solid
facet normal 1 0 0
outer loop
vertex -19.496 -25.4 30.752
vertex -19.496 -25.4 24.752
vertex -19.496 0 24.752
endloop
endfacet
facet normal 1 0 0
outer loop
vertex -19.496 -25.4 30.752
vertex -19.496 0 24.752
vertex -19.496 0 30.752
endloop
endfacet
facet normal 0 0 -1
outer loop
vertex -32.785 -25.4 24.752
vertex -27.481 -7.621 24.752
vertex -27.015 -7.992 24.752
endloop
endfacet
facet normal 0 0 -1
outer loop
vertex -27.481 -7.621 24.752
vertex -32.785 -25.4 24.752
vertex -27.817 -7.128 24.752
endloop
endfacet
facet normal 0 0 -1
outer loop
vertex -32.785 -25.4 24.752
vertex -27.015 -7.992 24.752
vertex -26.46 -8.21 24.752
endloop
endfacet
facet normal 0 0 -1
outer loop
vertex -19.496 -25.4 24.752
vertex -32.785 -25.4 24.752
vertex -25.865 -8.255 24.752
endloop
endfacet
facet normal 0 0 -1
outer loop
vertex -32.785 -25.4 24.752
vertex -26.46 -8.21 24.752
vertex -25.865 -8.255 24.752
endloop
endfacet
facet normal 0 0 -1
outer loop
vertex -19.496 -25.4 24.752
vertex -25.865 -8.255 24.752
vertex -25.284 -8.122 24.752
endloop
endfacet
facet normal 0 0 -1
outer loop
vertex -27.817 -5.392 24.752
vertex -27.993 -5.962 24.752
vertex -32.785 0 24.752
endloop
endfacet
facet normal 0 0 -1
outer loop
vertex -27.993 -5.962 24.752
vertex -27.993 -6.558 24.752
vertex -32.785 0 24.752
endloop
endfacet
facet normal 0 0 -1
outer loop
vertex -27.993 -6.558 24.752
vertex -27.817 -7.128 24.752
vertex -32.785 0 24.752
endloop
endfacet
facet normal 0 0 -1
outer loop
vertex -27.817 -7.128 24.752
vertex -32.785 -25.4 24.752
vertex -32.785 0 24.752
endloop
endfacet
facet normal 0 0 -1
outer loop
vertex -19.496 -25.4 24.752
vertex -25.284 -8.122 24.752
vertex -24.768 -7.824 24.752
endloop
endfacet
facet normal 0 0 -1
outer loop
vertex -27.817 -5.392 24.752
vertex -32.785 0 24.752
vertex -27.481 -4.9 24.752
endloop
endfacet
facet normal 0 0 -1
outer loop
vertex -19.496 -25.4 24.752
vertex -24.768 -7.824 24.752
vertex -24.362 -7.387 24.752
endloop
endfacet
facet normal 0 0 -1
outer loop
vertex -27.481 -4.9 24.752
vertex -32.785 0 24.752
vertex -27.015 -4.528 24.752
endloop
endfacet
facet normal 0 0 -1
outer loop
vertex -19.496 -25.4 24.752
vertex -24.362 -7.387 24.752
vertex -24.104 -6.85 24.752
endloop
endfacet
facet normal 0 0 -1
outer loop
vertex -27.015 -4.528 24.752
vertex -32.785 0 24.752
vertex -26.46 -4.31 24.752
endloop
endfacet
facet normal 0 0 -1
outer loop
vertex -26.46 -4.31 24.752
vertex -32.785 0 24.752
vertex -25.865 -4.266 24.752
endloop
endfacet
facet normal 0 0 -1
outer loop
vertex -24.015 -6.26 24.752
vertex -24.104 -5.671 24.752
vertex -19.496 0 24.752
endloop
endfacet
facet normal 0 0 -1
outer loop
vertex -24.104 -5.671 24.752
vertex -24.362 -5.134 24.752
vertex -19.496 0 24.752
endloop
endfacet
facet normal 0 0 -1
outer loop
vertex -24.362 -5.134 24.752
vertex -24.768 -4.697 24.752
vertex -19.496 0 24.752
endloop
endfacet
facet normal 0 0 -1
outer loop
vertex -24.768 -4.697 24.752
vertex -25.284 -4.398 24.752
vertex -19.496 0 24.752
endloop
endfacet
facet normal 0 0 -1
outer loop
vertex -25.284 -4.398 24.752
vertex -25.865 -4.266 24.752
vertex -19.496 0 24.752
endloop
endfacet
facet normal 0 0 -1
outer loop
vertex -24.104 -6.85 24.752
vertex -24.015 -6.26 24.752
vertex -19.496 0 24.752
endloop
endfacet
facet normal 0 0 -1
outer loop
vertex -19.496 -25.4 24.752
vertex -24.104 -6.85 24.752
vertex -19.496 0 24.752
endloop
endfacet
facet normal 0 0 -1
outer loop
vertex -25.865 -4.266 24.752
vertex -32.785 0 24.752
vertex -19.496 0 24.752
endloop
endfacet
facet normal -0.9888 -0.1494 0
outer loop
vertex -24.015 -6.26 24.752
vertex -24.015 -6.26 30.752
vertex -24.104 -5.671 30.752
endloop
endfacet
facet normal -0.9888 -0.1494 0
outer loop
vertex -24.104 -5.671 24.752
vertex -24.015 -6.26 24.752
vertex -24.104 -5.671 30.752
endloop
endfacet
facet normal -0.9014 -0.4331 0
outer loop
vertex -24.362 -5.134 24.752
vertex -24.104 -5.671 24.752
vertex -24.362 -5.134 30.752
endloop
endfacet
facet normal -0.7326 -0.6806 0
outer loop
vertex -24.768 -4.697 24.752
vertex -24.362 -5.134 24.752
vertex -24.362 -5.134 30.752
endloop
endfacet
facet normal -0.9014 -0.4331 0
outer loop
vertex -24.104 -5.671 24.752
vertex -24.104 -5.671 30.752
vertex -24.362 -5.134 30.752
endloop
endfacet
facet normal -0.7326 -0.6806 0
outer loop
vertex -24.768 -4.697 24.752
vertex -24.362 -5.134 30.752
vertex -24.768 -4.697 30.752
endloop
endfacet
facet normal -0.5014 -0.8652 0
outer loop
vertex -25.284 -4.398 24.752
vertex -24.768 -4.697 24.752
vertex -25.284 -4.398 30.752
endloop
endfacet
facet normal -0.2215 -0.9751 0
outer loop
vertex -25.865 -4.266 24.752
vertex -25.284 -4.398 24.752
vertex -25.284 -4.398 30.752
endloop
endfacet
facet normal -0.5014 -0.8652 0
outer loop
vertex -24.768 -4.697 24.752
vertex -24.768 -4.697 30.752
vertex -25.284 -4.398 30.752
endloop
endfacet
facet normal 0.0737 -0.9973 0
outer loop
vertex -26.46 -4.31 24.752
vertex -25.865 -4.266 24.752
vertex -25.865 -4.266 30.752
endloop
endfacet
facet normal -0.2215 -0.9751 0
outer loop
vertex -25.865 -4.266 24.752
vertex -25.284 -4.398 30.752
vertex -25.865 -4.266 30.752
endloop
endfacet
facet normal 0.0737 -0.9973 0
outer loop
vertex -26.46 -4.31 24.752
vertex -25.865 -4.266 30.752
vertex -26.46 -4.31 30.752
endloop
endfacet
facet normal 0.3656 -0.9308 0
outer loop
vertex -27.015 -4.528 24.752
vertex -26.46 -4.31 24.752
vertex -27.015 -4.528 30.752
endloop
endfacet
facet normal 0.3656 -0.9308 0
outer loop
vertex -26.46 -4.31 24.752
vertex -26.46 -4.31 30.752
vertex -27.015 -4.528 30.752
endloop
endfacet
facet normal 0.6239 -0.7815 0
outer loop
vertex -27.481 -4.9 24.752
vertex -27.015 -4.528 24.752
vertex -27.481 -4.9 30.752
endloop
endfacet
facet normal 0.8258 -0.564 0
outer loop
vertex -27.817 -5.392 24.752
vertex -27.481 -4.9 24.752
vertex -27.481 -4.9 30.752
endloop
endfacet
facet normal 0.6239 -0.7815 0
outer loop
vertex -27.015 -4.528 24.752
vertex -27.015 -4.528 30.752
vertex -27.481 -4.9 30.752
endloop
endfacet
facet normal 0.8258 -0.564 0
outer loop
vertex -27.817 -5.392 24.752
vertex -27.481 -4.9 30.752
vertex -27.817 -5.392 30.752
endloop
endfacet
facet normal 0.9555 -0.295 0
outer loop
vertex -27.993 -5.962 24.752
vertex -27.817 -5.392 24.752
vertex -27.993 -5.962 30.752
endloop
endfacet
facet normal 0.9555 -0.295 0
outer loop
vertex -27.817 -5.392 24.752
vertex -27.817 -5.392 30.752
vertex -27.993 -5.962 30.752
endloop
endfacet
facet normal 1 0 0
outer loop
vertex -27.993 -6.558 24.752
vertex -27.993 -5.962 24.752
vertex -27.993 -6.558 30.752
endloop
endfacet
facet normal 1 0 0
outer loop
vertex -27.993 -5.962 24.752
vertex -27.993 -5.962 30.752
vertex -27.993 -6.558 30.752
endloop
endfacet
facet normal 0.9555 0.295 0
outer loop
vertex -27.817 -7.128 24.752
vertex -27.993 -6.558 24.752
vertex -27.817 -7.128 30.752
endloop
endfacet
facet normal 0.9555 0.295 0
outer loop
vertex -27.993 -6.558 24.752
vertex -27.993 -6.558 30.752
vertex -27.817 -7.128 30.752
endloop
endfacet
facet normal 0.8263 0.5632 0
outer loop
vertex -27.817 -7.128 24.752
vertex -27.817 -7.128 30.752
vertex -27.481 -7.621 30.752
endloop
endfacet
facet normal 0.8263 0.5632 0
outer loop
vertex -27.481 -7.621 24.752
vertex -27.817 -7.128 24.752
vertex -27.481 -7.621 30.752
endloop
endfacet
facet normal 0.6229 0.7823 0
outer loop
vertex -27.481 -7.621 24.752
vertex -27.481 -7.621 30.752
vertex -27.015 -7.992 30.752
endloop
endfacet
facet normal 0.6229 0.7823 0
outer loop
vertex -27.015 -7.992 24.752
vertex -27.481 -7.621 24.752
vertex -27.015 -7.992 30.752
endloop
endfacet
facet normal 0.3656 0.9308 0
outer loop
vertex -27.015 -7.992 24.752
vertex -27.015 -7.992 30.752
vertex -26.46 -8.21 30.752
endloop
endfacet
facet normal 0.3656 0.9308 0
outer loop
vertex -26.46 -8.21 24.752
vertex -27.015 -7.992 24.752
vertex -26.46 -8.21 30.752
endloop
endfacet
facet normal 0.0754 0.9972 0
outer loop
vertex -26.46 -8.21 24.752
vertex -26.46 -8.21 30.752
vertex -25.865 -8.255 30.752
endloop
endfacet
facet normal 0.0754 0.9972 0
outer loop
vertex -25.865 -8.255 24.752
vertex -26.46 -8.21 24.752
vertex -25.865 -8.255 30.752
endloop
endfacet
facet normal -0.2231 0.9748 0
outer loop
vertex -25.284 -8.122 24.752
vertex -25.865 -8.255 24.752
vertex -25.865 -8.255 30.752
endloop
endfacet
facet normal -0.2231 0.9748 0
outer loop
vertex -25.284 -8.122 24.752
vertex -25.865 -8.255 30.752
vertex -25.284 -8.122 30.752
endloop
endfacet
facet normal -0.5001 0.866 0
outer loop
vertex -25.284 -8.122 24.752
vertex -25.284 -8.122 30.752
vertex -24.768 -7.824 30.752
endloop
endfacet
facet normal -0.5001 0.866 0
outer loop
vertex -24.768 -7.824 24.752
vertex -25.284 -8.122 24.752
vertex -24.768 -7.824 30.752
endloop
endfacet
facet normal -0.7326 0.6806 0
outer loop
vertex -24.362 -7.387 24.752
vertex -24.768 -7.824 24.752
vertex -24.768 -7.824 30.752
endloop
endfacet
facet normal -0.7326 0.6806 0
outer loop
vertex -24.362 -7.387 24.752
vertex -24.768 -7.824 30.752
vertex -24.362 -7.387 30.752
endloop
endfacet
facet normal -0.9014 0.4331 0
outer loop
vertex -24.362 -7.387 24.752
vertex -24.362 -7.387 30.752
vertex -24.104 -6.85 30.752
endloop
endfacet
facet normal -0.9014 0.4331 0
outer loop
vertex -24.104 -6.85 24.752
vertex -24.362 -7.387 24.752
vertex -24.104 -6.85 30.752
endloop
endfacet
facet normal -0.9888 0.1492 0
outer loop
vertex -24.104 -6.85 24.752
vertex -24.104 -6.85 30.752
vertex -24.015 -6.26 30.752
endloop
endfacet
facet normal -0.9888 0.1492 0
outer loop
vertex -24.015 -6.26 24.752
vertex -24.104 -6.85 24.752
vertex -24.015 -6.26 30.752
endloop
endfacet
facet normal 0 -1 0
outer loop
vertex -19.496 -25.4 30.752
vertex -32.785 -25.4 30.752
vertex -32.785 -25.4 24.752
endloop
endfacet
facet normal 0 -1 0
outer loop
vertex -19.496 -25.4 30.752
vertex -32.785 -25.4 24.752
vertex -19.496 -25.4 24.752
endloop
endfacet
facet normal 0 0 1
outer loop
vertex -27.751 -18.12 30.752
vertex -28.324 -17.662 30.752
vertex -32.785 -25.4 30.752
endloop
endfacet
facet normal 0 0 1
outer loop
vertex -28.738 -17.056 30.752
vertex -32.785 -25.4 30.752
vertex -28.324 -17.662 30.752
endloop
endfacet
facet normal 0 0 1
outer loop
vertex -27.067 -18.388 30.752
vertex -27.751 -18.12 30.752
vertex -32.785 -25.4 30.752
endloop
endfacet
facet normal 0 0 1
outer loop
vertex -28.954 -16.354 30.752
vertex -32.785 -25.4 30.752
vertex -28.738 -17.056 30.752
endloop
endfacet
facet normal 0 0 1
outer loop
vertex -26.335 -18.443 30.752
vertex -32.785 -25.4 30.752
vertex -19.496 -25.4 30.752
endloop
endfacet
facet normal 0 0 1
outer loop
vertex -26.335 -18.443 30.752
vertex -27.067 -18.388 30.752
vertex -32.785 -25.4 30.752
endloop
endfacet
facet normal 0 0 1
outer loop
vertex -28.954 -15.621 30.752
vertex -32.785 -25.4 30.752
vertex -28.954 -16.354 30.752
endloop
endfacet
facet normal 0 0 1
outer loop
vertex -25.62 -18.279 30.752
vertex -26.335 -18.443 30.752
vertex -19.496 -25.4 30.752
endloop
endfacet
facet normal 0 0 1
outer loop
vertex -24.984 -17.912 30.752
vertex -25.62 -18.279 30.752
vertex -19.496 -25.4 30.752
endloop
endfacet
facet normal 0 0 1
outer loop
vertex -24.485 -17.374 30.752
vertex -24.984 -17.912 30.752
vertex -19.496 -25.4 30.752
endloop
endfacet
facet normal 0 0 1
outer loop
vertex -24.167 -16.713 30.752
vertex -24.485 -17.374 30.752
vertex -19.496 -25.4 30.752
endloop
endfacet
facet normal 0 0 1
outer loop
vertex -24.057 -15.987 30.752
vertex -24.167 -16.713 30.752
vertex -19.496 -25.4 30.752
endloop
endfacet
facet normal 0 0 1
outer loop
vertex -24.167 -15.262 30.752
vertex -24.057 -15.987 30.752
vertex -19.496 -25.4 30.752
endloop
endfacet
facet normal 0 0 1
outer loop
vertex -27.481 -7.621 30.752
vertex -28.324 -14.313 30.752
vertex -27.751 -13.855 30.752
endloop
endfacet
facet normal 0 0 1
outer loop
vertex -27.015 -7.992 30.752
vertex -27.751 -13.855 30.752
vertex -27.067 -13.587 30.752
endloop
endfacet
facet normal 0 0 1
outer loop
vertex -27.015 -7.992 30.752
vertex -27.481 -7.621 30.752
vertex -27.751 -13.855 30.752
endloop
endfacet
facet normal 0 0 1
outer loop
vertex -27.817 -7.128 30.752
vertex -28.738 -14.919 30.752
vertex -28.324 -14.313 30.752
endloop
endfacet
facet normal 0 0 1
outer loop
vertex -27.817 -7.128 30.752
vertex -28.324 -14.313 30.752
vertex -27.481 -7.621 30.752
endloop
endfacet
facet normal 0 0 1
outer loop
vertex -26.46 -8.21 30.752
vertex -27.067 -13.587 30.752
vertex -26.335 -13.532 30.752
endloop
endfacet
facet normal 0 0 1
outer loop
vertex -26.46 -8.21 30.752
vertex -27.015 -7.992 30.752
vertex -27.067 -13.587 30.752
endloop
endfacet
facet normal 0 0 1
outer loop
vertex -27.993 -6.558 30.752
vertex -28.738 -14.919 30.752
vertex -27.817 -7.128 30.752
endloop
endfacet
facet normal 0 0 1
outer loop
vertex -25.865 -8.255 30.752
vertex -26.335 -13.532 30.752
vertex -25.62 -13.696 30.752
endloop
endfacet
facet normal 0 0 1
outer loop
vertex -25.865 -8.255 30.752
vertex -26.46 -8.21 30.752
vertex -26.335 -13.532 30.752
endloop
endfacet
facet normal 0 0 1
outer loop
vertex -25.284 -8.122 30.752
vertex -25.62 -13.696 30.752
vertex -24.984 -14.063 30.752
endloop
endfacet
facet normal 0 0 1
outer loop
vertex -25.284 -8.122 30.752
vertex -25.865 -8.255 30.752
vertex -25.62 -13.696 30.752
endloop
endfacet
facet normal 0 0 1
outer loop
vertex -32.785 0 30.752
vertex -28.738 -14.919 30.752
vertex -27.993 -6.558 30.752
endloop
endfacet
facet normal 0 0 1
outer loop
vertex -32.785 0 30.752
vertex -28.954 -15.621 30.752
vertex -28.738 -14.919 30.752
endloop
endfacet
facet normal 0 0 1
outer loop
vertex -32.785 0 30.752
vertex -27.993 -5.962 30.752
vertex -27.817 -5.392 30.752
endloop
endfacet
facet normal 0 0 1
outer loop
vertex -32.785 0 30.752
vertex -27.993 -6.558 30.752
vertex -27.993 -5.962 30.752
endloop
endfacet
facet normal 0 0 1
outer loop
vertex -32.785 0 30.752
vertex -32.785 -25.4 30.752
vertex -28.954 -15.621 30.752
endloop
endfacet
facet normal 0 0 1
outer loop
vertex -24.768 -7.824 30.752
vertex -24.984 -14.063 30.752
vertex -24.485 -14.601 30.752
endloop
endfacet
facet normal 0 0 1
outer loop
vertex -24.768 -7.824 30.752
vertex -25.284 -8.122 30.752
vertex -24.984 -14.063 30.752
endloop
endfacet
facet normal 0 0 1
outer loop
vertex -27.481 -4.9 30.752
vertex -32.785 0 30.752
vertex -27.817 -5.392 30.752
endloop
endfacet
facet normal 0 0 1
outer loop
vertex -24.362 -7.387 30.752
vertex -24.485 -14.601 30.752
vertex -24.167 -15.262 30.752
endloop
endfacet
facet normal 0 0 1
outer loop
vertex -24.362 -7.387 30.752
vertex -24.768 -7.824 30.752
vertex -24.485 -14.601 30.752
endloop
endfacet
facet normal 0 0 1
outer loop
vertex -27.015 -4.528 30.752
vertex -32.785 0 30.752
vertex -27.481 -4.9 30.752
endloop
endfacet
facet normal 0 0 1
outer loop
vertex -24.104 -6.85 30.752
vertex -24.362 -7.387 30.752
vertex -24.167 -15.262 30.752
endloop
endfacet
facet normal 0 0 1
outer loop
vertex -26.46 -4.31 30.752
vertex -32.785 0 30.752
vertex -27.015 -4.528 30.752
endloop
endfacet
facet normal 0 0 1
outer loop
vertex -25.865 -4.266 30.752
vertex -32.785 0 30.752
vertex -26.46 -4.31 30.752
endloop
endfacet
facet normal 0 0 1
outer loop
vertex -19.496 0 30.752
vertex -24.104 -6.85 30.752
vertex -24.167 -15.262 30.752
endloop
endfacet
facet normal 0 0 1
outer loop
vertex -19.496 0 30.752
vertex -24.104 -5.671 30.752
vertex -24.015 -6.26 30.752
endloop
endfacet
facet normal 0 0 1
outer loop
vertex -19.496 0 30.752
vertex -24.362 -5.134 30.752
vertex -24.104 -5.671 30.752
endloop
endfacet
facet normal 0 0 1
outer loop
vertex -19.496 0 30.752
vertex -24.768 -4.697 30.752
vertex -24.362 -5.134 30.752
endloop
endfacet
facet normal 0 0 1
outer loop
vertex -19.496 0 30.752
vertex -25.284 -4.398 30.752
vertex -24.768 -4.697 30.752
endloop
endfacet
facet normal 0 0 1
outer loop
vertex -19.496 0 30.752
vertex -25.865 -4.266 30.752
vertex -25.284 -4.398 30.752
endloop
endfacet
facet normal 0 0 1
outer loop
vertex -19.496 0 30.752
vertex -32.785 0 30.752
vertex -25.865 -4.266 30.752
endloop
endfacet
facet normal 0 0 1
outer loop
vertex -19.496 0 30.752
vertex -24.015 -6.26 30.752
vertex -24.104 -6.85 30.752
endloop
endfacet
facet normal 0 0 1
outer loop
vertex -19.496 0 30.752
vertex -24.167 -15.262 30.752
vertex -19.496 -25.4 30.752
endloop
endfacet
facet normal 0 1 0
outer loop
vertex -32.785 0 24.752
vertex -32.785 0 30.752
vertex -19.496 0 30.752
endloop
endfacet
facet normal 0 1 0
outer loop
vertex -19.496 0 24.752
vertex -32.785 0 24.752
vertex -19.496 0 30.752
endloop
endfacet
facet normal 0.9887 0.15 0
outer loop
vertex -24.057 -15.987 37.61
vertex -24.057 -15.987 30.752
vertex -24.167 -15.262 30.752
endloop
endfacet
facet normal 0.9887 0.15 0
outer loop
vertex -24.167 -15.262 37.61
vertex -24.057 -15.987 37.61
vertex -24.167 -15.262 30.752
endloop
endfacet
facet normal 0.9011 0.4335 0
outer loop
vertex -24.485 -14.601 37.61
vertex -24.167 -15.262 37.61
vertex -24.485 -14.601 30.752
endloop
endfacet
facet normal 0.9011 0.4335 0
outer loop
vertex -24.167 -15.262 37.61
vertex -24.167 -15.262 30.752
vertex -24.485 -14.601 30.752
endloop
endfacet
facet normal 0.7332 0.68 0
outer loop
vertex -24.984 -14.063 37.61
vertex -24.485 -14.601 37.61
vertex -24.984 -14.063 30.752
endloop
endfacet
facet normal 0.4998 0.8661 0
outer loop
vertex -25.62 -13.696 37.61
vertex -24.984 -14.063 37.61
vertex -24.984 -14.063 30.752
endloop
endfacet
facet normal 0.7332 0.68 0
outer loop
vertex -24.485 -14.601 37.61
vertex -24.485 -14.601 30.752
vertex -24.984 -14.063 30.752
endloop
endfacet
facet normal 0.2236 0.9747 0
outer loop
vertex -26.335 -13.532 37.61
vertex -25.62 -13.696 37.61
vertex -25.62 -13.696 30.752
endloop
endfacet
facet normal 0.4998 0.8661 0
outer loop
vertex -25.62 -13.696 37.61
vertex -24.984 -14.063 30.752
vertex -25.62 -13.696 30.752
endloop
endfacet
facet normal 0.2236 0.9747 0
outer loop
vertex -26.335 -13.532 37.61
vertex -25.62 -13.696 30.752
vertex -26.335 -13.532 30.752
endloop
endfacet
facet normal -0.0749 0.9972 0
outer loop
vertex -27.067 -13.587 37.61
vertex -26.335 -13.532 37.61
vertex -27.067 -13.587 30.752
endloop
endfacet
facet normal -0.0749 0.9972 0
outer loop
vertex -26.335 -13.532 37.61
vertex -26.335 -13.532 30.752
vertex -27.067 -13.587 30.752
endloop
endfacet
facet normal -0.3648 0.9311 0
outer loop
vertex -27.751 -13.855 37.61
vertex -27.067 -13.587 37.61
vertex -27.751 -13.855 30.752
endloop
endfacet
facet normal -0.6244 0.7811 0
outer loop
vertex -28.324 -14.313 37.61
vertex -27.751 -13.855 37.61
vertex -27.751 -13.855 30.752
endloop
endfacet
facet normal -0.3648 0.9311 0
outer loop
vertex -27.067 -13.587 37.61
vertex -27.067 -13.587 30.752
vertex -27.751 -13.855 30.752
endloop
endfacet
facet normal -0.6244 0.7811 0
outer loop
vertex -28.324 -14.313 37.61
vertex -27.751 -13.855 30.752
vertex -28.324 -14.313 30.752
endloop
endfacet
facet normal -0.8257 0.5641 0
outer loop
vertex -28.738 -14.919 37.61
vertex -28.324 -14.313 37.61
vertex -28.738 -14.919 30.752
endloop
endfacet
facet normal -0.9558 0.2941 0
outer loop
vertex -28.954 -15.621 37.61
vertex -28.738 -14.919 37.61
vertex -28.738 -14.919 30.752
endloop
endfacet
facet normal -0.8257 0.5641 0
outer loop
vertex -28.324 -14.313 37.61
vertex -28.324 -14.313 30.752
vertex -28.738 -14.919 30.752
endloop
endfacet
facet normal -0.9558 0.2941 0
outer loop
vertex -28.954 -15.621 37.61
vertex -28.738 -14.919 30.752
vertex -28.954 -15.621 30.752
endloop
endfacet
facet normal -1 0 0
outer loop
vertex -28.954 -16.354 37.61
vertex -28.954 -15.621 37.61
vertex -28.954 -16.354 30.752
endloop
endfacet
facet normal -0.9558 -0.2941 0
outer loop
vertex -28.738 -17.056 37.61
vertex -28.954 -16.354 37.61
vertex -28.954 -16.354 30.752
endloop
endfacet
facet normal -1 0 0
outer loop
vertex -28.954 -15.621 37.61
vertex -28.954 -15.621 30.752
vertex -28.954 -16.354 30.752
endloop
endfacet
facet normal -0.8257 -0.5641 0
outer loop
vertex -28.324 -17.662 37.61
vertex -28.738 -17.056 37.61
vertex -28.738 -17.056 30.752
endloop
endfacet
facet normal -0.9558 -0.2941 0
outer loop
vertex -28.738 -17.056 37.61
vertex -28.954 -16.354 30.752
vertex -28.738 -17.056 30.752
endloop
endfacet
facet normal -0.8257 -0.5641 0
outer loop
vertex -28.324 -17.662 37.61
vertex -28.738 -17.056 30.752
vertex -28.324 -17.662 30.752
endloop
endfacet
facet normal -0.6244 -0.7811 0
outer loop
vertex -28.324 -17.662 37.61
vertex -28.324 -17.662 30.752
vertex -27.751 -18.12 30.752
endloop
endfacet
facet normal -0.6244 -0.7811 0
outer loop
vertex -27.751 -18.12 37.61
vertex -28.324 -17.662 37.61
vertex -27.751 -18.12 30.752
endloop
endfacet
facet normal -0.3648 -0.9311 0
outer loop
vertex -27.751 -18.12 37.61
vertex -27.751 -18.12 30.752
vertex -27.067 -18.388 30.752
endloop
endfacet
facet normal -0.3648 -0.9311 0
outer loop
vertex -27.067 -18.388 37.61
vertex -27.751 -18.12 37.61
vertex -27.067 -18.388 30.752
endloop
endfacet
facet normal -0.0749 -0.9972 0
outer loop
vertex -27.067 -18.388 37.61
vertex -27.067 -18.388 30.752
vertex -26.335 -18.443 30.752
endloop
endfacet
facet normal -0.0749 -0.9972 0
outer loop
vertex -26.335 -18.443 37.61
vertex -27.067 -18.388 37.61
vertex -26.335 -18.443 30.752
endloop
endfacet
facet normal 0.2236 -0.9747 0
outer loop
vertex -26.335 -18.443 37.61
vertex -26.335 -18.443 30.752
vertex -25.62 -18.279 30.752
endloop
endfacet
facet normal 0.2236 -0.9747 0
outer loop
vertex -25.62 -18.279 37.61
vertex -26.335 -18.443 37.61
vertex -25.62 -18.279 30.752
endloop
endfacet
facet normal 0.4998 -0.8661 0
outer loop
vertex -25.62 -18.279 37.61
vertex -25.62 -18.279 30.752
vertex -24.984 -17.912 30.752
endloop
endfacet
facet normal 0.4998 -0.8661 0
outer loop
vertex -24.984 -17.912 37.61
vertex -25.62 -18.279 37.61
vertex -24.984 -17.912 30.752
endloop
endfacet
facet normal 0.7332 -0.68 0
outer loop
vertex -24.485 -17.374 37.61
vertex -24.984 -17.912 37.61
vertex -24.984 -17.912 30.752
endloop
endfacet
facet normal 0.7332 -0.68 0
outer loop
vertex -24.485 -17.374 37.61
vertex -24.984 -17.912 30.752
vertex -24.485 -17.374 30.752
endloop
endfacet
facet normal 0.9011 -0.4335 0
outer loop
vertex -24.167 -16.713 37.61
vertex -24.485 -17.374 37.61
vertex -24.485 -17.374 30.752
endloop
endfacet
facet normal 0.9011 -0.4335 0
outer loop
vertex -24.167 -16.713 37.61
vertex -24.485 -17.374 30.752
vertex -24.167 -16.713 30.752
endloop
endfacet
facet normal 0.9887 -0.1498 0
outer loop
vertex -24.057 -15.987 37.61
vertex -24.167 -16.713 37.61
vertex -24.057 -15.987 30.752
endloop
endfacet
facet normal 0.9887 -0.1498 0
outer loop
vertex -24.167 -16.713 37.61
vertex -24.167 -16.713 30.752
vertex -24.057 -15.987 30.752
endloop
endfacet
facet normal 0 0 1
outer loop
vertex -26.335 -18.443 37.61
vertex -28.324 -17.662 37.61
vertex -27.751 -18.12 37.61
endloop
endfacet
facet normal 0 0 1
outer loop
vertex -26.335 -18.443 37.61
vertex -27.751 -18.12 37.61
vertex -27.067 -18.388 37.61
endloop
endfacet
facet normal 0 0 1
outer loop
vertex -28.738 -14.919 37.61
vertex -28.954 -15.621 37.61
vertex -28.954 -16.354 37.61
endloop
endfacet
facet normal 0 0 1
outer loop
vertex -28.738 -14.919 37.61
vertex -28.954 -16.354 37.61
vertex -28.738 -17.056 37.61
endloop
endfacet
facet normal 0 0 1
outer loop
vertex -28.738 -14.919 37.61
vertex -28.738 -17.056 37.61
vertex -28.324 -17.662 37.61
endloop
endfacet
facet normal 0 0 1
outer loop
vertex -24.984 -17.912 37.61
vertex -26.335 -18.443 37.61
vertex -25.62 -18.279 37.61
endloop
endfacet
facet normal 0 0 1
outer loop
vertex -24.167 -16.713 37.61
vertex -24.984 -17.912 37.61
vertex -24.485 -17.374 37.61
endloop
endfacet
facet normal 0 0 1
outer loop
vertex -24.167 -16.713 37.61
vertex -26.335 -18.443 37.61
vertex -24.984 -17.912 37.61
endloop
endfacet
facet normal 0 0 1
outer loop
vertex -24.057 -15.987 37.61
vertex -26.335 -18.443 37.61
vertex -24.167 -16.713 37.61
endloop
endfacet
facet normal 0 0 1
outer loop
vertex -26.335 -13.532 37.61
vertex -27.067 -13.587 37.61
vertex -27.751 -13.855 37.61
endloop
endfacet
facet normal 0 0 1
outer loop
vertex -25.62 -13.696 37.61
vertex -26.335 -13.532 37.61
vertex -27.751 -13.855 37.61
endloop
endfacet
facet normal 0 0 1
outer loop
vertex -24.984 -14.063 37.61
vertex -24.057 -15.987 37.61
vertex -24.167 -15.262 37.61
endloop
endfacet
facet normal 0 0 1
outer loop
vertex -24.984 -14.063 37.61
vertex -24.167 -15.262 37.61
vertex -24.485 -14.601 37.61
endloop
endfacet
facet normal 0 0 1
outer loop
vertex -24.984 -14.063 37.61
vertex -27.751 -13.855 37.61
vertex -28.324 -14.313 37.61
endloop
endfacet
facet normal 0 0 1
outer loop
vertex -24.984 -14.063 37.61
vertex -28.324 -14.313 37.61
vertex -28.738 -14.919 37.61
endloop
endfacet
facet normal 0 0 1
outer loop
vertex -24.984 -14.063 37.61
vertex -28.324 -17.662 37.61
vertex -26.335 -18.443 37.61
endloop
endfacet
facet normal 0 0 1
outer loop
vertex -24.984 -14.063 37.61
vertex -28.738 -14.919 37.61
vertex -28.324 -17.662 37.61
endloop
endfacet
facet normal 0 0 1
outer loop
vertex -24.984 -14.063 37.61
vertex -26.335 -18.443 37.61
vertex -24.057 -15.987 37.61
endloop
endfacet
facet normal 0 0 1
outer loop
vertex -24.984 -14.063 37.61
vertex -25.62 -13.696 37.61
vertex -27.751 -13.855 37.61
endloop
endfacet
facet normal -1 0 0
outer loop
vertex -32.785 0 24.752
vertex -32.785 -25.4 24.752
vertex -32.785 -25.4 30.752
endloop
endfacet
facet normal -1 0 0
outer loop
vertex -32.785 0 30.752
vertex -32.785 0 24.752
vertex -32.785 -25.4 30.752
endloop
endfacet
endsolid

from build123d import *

# Parameters (mm, degrees)
F0_W     = 13.288778
F0_H     = 6
F1_DEPTH = 25.4
F2_R     = 2
F3_DEPTH = 25.4
F4_R     = 2.462138
F5_DEPTH = 6.858


with BuildPart() as f1:
    # F0 (on Front) → F1 (new body)
    with BuildSketch(Plane.XZ):
        with Locations((-26.140303, 27.751791)):
            Rectangle(F0_W, F0_H)
    extrude(amount=F1_DEPTH)

    # F2 (on face) → F3 (cut)
    with BuildSketch(Plane.XY.offset(30.751791)):
        with Locations((-26.014924, -6.260172)):
            Circle(F2_R)
    extrude(amount=-F3_DEPTH, mode=Mode.SUBTRACT)

    # F4 (on face) → F5 (join)
    with BuildSketch(Plane.XY.offset(30.751791)):
        with Locations((-26.519462, -15.987486)):
            Circle(F4_R)
    extrude(amount=F5_DEPTH)


solid = f1.part
